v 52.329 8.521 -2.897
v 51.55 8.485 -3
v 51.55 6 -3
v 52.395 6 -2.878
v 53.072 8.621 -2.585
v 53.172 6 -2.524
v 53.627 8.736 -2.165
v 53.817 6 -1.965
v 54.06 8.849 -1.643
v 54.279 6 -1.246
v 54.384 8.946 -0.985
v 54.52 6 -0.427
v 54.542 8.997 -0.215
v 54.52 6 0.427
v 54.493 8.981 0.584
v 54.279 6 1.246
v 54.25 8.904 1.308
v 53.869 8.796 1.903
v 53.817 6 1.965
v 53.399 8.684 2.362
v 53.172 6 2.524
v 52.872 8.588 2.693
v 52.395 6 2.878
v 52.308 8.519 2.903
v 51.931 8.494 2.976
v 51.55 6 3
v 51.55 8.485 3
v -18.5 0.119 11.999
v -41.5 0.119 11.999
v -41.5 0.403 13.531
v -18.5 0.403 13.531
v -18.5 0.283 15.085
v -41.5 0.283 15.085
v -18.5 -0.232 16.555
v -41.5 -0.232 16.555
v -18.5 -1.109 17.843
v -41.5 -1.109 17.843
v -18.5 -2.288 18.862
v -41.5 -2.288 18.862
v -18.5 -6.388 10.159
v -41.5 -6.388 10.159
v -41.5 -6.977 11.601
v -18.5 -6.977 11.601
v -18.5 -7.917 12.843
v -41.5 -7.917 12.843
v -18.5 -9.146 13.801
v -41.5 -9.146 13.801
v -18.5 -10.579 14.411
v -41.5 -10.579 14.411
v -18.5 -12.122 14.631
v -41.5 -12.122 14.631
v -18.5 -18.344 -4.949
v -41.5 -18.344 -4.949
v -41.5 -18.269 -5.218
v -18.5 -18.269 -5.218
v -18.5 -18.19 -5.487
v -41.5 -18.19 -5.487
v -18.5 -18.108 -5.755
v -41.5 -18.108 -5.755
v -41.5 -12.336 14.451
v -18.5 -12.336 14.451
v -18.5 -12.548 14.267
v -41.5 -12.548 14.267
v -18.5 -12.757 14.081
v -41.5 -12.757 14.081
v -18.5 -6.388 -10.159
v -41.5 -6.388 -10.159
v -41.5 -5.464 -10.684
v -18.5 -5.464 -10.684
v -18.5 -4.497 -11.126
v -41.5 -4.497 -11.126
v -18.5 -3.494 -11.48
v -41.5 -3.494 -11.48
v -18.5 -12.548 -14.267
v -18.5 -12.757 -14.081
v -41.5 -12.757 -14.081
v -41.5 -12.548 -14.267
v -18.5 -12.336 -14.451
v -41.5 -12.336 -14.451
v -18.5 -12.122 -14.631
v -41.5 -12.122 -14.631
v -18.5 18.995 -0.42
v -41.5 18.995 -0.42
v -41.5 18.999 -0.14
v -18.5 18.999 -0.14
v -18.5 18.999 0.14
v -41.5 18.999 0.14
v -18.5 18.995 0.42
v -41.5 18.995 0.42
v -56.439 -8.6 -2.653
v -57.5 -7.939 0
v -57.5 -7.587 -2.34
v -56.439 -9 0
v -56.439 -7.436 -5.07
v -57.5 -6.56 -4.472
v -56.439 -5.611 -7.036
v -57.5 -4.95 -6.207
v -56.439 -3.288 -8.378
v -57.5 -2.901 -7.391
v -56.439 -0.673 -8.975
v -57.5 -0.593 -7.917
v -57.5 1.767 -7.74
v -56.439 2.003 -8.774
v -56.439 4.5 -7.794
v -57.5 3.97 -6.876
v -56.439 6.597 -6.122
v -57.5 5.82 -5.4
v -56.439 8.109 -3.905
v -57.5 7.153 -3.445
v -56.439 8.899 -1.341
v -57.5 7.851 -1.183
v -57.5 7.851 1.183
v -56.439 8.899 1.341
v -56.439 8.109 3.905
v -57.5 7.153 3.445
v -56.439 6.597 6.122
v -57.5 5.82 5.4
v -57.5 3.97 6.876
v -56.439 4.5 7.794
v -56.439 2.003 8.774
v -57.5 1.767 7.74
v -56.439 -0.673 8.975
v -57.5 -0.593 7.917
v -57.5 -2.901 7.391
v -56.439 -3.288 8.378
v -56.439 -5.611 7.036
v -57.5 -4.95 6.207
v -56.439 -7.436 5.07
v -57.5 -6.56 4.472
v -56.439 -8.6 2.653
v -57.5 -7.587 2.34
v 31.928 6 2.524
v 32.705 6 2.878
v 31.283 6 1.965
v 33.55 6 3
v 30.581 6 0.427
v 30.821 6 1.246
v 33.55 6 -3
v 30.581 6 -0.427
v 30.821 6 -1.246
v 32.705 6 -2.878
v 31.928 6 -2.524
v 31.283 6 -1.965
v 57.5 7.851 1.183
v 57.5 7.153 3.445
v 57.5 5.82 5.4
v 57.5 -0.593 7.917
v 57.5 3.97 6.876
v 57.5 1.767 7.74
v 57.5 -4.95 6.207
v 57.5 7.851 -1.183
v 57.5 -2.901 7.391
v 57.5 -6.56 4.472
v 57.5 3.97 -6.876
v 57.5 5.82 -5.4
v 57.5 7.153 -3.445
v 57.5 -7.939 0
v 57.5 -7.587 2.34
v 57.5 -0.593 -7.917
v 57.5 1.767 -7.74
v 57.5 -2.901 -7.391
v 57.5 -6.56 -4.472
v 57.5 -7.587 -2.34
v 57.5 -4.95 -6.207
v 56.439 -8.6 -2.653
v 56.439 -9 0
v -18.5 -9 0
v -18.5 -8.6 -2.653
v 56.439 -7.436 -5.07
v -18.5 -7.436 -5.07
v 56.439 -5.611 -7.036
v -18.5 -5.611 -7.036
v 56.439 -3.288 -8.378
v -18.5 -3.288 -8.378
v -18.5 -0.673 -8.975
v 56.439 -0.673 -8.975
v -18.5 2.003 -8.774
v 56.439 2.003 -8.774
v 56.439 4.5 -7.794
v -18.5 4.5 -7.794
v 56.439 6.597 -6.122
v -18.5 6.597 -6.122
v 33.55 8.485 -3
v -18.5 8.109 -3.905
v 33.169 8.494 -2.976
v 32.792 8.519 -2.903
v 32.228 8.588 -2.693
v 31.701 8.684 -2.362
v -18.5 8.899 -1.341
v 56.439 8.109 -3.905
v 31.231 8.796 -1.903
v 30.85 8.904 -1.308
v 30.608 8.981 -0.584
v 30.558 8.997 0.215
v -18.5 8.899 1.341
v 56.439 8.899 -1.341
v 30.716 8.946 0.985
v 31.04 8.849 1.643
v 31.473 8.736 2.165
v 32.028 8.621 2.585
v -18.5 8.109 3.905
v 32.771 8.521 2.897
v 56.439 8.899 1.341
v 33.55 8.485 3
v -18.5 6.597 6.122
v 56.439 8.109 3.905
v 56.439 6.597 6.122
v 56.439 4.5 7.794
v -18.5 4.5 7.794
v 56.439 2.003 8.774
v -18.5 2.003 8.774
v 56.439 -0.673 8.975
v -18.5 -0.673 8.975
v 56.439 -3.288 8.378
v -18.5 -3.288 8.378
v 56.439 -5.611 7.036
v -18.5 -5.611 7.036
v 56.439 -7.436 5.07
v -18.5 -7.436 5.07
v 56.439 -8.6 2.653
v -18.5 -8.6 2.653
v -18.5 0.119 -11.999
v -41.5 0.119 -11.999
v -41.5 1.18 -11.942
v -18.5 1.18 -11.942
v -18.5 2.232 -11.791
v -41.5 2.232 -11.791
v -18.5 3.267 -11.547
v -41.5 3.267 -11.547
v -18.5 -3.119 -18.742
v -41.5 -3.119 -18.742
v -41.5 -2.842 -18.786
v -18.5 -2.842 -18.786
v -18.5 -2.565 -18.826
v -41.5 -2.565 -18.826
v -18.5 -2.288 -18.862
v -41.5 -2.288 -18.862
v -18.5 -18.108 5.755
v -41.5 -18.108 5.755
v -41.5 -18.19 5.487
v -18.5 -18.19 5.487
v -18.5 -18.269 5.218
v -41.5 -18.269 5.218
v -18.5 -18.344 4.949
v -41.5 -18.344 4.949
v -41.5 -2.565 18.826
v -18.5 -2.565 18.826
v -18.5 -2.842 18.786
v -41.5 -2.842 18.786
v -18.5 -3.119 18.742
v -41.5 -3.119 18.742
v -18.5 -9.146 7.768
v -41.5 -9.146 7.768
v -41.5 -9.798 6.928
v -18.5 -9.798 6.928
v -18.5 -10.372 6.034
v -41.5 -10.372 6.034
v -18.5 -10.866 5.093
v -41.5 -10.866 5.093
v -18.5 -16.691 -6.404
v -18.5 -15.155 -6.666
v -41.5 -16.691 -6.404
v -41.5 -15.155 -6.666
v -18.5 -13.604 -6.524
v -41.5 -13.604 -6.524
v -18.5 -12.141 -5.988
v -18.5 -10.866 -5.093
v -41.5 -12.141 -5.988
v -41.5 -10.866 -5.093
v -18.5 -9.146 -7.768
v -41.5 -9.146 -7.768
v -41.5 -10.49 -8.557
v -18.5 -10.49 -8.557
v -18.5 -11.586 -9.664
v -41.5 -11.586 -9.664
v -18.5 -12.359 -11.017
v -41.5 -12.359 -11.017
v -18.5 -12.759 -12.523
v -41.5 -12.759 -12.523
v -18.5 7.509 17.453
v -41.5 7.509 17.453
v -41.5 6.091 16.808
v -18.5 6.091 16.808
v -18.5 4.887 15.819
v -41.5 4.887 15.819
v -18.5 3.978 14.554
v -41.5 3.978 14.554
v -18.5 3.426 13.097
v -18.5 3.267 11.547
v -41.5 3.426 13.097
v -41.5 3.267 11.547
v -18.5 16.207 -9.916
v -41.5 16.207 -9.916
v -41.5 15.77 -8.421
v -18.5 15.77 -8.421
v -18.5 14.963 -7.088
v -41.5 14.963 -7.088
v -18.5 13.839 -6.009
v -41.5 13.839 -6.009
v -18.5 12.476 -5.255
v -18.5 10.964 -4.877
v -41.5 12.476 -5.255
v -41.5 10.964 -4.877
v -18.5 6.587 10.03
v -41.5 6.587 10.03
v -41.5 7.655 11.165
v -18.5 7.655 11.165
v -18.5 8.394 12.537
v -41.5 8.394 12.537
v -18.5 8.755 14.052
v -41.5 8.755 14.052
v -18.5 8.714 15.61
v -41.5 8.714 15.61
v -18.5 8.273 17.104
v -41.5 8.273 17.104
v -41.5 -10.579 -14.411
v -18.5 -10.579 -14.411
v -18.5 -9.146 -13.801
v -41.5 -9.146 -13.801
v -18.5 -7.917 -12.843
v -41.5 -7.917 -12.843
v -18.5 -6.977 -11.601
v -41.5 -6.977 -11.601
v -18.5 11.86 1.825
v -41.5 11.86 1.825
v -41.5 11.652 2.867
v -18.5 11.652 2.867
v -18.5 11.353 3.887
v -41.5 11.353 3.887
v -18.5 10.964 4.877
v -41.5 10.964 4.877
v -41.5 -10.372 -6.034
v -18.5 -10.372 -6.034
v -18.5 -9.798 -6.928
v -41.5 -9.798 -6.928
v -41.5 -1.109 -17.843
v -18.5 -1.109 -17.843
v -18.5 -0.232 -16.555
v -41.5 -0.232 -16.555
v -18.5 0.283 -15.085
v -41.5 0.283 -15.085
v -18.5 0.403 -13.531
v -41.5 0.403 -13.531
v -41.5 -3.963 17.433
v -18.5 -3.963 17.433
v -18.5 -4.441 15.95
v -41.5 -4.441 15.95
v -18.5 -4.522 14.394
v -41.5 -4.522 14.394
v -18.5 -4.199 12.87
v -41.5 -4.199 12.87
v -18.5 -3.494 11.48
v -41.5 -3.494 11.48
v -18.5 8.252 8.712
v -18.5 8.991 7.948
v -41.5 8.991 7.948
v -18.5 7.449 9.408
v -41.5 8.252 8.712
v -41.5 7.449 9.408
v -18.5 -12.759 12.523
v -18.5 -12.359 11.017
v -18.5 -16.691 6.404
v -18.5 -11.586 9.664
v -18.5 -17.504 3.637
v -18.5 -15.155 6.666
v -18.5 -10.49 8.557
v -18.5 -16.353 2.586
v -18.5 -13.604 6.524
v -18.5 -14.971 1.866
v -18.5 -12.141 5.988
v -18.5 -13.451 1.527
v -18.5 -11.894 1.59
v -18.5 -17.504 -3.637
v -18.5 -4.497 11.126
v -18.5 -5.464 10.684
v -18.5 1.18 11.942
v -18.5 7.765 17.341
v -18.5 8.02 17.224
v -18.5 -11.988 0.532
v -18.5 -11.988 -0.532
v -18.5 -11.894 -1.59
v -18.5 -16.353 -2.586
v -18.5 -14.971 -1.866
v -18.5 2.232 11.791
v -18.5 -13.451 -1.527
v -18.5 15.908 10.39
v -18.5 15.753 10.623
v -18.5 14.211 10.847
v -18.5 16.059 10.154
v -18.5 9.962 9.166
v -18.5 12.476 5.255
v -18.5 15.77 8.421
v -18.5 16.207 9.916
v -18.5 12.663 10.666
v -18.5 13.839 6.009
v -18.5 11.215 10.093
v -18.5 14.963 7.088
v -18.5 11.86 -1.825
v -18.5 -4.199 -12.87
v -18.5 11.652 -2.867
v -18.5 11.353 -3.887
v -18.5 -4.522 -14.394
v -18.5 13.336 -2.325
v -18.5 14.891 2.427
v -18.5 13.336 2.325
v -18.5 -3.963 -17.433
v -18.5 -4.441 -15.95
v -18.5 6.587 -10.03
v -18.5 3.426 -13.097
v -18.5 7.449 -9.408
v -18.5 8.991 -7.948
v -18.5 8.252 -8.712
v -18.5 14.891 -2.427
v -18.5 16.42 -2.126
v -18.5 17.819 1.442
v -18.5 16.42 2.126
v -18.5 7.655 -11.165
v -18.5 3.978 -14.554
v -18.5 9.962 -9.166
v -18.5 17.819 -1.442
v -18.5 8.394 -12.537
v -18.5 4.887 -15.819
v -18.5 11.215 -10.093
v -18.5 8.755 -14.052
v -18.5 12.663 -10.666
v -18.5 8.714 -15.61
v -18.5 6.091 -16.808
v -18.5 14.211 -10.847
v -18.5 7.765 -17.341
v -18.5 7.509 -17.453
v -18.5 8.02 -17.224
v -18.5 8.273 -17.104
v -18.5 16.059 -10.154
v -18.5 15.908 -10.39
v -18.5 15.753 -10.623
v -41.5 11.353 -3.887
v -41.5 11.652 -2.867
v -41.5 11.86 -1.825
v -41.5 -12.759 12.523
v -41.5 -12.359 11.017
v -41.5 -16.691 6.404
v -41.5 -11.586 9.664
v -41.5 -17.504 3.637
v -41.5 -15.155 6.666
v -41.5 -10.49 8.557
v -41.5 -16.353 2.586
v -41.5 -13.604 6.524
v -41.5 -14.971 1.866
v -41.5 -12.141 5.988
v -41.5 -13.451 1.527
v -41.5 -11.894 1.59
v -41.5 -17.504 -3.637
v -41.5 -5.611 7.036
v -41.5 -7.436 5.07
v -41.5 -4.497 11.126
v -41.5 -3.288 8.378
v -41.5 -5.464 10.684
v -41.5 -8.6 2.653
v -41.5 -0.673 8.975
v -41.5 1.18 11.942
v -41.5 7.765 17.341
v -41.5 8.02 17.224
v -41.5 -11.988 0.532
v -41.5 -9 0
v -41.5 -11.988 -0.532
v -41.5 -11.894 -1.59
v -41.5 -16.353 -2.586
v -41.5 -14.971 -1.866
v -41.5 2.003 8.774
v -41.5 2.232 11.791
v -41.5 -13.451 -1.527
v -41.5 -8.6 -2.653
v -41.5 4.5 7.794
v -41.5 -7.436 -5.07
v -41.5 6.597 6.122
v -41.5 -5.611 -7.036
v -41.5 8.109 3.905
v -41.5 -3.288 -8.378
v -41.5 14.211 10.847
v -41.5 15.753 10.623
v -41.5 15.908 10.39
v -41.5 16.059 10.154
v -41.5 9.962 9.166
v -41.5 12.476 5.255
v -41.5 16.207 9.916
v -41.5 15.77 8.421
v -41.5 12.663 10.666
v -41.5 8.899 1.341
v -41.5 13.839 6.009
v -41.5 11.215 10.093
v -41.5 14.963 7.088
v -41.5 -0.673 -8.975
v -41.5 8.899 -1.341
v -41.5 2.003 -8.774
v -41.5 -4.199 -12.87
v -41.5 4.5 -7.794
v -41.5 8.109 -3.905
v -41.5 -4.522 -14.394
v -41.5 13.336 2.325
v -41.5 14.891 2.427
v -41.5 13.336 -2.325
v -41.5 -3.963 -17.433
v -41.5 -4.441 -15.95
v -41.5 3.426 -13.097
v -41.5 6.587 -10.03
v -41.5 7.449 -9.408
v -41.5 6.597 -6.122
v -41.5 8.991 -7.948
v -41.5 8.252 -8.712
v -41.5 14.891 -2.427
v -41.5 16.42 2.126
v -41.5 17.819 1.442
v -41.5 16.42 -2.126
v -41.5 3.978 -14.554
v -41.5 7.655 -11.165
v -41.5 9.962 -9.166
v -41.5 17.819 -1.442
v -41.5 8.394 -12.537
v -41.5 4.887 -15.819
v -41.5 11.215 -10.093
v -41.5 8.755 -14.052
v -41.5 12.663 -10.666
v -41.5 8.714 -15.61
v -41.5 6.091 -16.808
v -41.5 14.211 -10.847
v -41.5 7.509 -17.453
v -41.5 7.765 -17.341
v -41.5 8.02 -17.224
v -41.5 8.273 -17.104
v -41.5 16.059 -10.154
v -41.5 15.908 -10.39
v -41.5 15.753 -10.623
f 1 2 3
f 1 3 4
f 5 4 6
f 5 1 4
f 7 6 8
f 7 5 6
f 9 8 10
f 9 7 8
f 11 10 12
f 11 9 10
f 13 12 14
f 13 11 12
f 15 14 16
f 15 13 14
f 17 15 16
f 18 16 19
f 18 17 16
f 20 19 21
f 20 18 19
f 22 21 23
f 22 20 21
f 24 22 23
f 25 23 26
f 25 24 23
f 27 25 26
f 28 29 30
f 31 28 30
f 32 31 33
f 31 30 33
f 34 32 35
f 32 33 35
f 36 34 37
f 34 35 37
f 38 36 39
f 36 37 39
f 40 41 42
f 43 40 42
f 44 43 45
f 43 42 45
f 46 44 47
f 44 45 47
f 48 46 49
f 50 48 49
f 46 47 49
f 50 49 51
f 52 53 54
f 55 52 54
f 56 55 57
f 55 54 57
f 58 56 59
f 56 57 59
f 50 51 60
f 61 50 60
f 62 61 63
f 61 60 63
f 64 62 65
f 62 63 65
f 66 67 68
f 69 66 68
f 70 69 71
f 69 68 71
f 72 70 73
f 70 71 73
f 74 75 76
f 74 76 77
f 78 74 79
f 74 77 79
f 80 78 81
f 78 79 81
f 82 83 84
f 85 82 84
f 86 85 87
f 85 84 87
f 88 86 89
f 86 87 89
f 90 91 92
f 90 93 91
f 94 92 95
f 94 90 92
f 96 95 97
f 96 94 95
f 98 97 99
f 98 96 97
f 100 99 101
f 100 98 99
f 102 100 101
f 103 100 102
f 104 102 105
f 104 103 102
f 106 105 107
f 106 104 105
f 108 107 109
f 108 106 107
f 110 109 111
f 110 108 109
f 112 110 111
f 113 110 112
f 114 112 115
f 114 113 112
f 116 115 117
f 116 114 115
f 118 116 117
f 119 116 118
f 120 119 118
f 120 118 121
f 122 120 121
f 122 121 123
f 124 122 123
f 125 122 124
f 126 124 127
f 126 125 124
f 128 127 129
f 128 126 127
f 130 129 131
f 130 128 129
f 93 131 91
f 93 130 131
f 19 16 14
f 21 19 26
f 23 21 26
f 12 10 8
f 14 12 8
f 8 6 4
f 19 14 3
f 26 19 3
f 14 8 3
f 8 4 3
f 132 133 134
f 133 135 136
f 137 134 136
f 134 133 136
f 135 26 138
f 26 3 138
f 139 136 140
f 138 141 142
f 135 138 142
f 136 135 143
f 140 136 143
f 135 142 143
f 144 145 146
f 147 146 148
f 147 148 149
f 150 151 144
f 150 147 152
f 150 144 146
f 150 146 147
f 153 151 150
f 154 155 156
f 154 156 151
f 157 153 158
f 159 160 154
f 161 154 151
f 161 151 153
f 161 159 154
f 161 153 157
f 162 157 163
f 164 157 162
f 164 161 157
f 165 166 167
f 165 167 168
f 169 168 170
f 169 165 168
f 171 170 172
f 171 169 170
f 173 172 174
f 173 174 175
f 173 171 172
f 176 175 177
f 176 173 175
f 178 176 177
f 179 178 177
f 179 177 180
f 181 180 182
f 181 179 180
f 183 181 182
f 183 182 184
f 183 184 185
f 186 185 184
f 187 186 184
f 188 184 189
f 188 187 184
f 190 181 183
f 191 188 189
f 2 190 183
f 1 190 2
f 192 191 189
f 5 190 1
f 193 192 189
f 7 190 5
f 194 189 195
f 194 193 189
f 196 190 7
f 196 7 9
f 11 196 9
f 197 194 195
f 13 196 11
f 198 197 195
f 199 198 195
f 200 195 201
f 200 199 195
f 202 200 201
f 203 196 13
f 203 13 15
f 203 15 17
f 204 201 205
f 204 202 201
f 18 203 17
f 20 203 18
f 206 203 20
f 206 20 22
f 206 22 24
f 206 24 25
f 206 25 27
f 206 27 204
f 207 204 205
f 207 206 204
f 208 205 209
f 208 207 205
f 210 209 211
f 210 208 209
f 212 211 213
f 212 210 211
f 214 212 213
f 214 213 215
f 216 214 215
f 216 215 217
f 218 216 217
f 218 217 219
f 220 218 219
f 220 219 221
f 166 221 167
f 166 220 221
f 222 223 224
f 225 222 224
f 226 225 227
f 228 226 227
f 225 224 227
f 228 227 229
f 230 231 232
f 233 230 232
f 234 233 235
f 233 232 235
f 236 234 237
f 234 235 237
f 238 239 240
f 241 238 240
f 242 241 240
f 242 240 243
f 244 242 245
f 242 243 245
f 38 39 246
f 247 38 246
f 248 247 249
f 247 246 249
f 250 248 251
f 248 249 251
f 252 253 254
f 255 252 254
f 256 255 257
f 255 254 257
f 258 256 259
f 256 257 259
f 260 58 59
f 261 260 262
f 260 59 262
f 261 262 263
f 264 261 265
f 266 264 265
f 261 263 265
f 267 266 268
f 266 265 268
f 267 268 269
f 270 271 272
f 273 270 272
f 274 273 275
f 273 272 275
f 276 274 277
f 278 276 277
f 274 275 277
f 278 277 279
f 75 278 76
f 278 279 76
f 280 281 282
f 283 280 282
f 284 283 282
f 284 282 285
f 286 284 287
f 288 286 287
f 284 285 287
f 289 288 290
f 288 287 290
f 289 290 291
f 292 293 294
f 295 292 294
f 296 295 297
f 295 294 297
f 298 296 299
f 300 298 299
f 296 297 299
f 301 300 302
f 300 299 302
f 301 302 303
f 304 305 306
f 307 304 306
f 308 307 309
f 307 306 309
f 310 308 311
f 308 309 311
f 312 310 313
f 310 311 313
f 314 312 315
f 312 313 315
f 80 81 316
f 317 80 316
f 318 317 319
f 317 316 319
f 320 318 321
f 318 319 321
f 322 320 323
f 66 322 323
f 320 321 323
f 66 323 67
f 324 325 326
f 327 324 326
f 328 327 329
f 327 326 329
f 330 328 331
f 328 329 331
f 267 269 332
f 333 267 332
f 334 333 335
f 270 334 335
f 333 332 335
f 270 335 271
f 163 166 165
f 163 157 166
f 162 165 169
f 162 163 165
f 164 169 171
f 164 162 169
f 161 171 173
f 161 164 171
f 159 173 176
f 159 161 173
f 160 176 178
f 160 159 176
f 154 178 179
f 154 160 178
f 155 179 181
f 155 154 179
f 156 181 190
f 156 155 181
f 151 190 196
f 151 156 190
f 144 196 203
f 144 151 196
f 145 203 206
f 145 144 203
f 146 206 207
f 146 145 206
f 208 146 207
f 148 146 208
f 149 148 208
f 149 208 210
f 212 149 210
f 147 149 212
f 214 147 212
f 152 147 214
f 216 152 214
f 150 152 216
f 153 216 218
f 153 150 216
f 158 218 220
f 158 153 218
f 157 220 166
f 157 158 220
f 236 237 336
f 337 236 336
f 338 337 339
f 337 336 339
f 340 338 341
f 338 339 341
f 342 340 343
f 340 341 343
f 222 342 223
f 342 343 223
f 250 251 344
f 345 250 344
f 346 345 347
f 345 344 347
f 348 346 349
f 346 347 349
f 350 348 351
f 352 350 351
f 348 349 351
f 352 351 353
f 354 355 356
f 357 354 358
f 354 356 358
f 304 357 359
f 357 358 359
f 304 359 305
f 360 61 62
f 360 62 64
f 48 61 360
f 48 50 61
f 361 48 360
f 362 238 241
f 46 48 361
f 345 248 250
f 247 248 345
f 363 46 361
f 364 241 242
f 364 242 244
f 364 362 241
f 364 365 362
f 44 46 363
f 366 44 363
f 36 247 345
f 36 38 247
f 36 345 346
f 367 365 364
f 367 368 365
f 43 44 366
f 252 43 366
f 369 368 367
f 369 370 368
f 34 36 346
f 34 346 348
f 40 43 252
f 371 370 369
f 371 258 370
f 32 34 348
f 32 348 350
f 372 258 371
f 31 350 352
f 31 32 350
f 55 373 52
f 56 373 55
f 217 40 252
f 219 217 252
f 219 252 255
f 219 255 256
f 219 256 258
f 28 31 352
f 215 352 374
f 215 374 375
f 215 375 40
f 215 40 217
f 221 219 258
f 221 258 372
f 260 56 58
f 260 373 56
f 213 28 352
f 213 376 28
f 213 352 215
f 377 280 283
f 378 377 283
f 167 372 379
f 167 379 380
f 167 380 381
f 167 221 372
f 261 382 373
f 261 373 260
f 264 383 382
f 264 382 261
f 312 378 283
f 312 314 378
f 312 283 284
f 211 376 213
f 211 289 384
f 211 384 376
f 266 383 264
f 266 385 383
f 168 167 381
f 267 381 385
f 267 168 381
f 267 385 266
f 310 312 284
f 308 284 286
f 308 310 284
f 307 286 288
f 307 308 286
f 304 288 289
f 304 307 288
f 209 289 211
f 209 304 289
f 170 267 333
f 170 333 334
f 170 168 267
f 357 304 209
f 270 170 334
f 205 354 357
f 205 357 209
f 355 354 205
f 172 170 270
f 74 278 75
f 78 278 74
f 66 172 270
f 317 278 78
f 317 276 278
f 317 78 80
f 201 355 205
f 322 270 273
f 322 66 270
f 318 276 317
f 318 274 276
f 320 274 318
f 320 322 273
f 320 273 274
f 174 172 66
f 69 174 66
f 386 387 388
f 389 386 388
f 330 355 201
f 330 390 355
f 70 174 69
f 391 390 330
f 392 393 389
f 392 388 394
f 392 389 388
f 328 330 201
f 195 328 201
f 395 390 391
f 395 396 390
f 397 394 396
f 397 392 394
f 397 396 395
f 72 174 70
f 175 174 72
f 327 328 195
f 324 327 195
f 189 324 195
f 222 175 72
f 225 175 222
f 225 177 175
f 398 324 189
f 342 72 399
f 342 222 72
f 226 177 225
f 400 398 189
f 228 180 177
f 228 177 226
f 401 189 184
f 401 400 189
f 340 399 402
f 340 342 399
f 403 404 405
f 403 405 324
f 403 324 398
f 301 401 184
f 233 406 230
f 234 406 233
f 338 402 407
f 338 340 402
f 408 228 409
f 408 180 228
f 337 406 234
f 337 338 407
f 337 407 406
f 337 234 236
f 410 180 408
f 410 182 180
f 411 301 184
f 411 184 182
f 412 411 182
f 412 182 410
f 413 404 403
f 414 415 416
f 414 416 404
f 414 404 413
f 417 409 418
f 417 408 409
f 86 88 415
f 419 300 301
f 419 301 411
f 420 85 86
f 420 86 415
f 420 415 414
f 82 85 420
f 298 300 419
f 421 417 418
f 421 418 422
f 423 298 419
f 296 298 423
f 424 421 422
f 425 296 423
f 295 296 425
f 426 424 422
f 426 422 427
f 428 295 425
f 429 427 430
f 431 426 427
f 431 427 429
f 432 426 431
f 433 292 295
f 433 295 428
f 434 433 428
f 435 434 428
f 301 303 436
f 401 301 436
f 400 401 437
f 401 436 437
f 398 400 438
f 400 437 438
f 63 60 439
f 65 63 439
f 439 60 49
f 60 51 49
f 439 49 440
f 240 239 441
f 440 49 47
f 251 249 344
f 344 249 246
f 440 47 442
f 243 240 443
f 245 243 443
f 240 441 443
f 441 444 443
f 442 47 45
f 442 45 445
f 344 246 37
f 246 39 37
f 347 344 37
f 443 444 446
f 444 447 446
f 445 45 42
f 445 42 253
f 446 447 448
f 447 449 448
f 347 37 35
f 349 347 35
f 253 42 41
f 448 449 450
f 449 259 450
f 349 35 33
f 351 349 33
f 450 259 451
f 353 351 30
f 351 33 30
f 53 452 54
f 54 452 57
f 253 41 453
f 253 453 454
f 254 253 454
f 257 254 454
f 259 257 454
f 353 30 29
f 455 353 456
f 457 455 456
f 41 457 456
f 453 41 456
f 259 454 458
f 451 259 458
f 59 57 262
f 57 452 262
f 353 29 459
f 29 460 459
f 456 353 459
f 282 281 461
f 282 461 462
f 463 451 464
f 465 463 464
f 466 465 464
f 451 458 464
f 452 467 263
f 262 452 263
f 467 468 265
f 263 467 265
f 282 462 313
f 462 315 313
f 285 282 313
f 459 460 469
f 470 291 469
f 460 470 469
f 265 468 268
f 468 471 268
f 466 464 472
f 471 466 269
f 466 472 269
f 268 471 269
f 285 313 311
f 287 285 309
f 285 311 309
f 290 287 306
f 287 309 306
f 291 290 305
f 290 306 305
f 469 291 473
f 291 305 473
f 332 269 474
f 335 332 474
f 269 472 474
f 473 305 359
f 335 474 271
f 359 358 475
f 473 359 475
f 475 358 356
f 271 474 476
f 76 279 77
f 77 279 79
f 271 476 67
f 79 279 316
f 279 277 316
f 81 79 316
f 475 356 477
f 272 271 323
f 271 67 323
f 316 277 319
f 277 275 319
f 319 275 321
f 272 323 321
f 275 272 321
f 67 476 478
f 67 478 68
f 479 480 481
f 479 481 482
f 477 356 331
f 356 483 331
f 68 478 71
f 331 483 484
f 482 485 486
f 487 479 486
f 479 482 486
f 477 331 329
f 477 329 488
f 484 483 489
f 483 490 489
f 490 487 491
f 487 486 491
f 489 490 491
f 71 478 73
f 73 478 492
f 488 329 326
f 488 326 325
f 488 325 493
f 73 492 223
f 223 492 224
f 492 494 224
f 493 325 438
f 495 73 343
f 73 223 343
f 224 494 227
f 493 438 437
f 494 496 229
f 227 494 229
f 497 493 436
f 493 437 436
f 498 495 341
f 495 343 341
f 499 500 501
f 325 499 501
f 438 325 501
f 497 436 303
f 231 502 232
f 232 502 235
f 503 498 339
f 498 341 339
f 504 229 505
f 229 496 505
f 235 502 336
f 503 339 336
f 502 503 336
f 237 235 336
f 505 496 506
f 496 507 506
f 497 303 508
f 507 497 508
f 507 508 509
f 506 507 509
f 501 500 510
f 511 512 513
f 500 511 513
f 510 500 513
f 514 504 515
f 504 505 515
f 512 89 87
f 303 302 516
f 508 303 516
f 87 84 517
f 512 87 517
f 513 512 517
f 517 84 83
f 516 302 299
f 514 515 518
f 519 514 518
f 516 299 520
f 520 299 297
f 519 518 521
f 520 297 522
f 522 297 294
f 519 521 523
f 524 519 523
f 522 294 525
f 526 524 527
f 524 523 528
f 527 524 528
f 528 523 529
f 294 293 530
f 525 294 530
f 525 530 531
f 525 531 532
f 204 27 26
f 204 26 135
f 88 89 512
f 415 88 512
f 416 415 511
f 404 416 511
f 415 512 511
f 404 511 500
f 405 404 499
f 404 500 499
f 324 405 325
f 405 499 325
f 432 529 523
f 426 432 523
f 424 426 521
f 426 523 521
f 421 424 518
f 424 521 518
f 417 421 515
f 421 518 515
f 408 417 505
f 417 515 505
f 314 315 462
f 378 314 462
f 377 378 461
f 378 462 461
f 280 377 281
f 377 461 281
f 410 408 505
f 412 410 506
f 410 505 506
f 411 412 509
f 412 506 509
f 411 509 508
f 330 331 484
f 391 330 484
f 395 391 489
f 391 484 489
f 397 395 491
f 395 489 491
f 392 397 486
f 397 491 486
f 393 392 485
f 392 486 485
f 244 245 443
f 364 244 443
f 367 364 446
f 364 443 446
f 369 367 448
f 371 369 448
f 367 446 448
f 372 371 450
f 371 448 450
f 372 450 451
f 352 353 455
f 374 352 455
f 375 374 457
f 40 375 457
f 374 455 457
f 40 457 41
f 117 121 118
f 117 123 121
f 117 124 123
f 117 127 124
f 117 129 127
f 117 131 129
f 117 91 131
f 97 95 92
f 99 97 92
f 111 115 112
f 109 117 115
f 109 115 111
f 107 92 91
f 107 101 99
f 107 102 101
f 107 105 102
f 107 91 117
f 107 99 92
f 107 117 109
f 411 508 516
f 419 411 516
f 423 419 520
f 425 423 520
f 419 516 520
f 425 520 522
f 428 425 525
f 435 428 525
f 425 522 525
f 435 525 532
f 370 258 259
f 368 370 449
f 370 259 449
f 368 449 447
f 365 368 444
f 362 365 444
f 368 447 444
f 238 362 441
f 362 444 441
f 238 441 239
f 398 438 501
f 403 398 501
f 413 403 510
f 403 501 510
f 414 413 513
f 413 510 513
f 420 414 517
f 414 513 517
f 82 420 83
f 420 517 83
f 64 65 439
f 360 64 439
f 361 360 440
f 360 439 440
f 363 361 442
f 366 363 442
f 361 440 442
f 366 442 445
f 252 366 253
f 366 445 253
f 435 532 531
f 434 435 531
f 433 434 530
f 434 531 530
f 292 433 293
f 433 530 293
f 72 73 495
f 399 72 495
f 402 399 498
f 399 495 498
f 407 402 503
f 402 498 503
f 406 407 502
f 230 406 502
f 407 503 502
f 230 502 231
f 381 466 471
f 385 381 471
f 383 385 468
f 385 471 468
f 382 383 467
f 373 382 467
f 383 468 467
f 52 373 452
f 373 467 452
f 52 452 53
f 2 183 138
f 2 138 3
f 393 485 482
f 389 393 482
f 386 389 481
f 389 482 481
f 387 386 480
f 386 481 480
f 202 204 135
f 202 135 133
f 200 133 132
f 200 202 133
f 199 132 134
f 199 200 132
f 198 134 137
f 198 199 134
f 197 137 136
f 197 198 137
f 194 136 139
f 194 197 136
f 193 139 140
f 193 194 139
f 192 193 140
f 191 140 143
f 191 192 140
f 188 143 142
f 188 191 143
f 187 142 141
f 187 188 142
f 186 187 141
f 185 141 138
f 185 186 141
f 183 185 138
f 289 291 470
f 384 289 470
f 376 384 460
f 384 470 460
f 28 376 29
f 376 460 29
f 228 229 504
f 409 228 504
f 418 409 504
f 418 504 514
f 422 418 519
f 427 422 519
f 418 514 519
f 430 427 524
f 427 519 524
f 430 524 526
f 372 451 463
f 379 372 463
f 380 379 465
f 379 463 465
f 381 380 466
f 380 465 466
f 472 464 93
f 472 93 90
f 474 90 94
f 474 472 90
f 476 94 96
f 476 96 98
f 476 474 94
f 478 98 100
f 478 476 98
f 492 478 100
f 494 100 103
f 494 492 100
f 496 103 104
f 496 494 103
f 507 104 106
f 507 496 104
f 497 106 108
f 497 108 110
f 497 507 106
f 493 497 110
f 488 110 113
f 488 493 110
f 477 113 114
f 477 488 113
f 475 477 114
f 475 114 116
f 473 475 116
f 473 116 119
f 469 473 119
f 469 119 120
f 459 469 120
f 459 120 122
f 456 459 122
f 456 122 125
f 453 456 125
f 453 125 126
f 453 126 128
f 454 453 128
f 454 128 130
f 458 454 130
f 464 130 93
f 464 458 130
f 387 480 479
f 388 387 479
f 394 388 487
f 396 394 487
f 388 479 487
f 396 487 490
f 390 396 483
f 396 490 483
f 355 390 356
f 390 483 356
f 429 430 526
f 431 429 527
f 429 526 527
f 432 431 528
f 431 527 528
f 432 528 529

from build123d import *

# Parameters (mm, degrees)
BOSS_EXTRUDE1_DEPTH = 23
CUT_EXTRUDE1_DEPTH  = 3


with BuildPart() as part:
    # Sketch1 → Revolve1 (revolve)
    with BuildSketch(Plane.XY):
        Polygon((-57.5, 0), (-57.5, -7.939339828), (-56.439339828, -9), (56.439339828, -9), (57.5, -7.939339828), (57.5, 0), align=None)
    revolve(axis=Axis((-100, 0, 0), (1, 0, 0)))

    # Sketch2 → Boss-Extrude1 (add)
    with BuildSketch(Plane.ZY.offset(41.5)):
        with BuildLine():
            ThreePointArc((-7.947510586, 8.990944082), (-10.426372404, 11.920385617), (-10.622991997, 15.752842316))
            ThreePointArc((-10.622991997, 15.752842316), (-10.272175532, 15.983817124), (-9.91633903, 16.206980602))
            ThreePointArc((-9.91633903, 16.206980602), (-6.511892526, 14.43606908), (-4.876935192, 10.964283065))
            ThreePointArc((-4.876935192, 10.964283065), (-3.380790682, 11.513915683), (-1.825, 11.860412092))
            ThreePointArc((-1.825, 11.860412092), (-2.326575595, 15.664989012), (-0.42, 18.995357328))
            ThreePointArc((-0.42, 18.995357328), (0, 19), (0.42, 18.995357328))
            ThreePointArc((0.42, 18.995357328), (2.326575595, 15.664989012), (1.825, 11.860412092))
            ThreePointArc((1.825, 11.860412092), (3.380790682, 11.513915683), (4.876935192, 10.964283065))
            ThreePointArc((4.876935192, 10.964283065), (6.511892526, 14.43606908), (9.91633903, 16.206980602))
            ThreePointArc((9.91633903, 16.206980602), (10.272175532, 15.983817124), (10.622991997, 15.752842316))
            ThreePointArc((10.622991997, 15.752842316), (10.426372404, 11.920385617), (7.947510586, 8.990944082))
            ThreePointArc((7.947510586, 8.990944082), (9.068994892, 7.858328807), (10.030477919, 6.587071635))
            ThreePointArc((10.030477919, 6.587071635), (13.282880781, 8.623799215), (17.104310483, 8.273002049))
            ThreePointArc((17.104310483, 8.273002049), (17.283007912, 7.892885247), (17.453259094, 7.508911173))
            ThreePointArc((17.453259094, 7.508911173), (15.215869643, 4.391144013), (11.546742716, 3.266914852))
            ThreePointArc((11.546742716, 3.266914852), (11.877857303, 1.707778059), (11.999414778, 0.118511503))
            ThreePointArc((11.999414778, 0.118511503), (15.836648241, 0.073534032), (18.861784211, -2.2875962))
            ThreePointArc((18.861784211, -2.2875962), (18.806607396, -2.703981927), (18.742239747, -3.119046212))
            ThreePointArc((18.742239747, -3.119046212), (15.174435781, -4.532254788), (11.479965619, -3.49433676))
            ThreePointArc((11.479965619, -3.49433676), (10.915583944, -4.984980156), (10.15862223, -6.387675194))
            ThreePointArc((10.15862223, -6.387675194), (13.36239178, -8.500077686), (14.630774723, -12.12189882))
            ThreePointArc((14.630774723, -12.12189882), (14.359241913, -12.442353945), (14.080691707, -12.756728462))
            ThreePointArc((14.080691707, -12.756728462), (10.315225776, -12.016694717), (7.768380551, -9.146161141))
            ThreePointArc((7.768380551, -9.146161141), (6.487689809, -10.095042394), (5.092538901, -10.865820151))
            ThreePointArc((5.092538901, -10.865820151), (6.645670343, -14.374974798), (5.754597637, -18.107584213))
            ThreePointArc((5.754597637, -18.107584213), (5.35291858, -18.230366499), (4.948623539, -18.344239561))
            ThreePointArc((4.948623539, -18.344239561), (2.181004471, -15.68591898), (1.590389547, -11.894143983))
            ThreePointArc((1.590389547, -11.894143983), (0, -12), (-1.590389547, -11.894143983))
            ThreePointArc((-1.590389547, -11.894143983), (-2.181004471, -15.68591898), (-4.948623539, -18.344239561))
            ThreePointArc((-4.948623539, -18.344239561), (-5.35291858, -18.230366499), (-5.754597637, -18.107584213))
            ThreePointArc((-5.754597637, -18.107584213), (-6.645670343, -14.374974798), (-5.092538901, -10.865820151))
            ThreePointArc((-5.092538901, -10.865820151), (-6.487689809, -10.095042394), (-7.768380551, -9.146161141))
            ThreePointArc((-7.768380551, -9.146161141), (-10.315225776, -12.016694717), (-14.080691707, -12.756728462))
            ThreePointArc((-14.080691707, -12.756728462), (-14.359241913, -12.442353945), (-14.630774723, -12.12189882))
            ThreePointArc((-14.630774723, -12.12189882), (-13.36239178, -8.500077686), (-10.15862223, -6.387675194))
            ThreePointArc((-10.15862223, -6.387675194), (-10.915583944, -4.984980156), (-11.479965619, -3.49433676))
            ThreePointArc((-11.479965619, -3.49433676), (-15.174435781, -4.532254788), (-18.742239747, -3.119046212))
            ThreePointArc((-18.742239747, -3.119046212), (-18.806607396, -2.703981927), (-18.861784211, -2.2875962))
            ThreePointArc((-18.861784211, -2.2875962), (-15.836648241, 0.073534032), (-11.999414778, 0.118511503))
            ThreePointArc((-11.999414778, 0.118511503), (-11.877857303, 1.707778059), (-11.546742716, 3.266914852))
            ThreePointArc((-11.546742716, 3.266914852), (-15.215869643, 4.391144013), (-17.453259094, 7.508911173))
            ThreePointArc((-17.453259094, 7.508911173), (-17.283007912, 7.892885247), (-17.104310483, 8.273002049))
            ThreePointArc((-17.104310483, 8.273002049), (-13.282880781, 8.623799215), (-10.030477919, 6.587071635))
            ThreePointArc((-10.030477919, 6.587071635), (-9.068994892, 7.858328807), (-7.947510586, 8.990944082))
        make_face()
    extrude(amount=-BOSS_EXTRUDE1_DEPTH)

    # Sketch4 → Cut-Extrude1 (cut)
    with BuildSketch(Plane(origin=(0, 9, 0), x_dir=(1, 0, 0), z_dir=(0, 1, 0))):
        with BuildLine():
            Line((33.550041919, 3), (51.550041919, 3))
            ThreePointArc((51.550041919, 3), (54.550041919, 0), (51.550041919, -3))
            Line((51.550041919, -3), (33.550041919, -3))
            ThreePointArc((33.550041919, -3), (30.550041919, 0), (33.550041919, 3))
        make_face()
    extrude(amount=-CUT_EXTRUDE1_DEPTH, mode=Mode.SUBTRACT)


solid = part.part
